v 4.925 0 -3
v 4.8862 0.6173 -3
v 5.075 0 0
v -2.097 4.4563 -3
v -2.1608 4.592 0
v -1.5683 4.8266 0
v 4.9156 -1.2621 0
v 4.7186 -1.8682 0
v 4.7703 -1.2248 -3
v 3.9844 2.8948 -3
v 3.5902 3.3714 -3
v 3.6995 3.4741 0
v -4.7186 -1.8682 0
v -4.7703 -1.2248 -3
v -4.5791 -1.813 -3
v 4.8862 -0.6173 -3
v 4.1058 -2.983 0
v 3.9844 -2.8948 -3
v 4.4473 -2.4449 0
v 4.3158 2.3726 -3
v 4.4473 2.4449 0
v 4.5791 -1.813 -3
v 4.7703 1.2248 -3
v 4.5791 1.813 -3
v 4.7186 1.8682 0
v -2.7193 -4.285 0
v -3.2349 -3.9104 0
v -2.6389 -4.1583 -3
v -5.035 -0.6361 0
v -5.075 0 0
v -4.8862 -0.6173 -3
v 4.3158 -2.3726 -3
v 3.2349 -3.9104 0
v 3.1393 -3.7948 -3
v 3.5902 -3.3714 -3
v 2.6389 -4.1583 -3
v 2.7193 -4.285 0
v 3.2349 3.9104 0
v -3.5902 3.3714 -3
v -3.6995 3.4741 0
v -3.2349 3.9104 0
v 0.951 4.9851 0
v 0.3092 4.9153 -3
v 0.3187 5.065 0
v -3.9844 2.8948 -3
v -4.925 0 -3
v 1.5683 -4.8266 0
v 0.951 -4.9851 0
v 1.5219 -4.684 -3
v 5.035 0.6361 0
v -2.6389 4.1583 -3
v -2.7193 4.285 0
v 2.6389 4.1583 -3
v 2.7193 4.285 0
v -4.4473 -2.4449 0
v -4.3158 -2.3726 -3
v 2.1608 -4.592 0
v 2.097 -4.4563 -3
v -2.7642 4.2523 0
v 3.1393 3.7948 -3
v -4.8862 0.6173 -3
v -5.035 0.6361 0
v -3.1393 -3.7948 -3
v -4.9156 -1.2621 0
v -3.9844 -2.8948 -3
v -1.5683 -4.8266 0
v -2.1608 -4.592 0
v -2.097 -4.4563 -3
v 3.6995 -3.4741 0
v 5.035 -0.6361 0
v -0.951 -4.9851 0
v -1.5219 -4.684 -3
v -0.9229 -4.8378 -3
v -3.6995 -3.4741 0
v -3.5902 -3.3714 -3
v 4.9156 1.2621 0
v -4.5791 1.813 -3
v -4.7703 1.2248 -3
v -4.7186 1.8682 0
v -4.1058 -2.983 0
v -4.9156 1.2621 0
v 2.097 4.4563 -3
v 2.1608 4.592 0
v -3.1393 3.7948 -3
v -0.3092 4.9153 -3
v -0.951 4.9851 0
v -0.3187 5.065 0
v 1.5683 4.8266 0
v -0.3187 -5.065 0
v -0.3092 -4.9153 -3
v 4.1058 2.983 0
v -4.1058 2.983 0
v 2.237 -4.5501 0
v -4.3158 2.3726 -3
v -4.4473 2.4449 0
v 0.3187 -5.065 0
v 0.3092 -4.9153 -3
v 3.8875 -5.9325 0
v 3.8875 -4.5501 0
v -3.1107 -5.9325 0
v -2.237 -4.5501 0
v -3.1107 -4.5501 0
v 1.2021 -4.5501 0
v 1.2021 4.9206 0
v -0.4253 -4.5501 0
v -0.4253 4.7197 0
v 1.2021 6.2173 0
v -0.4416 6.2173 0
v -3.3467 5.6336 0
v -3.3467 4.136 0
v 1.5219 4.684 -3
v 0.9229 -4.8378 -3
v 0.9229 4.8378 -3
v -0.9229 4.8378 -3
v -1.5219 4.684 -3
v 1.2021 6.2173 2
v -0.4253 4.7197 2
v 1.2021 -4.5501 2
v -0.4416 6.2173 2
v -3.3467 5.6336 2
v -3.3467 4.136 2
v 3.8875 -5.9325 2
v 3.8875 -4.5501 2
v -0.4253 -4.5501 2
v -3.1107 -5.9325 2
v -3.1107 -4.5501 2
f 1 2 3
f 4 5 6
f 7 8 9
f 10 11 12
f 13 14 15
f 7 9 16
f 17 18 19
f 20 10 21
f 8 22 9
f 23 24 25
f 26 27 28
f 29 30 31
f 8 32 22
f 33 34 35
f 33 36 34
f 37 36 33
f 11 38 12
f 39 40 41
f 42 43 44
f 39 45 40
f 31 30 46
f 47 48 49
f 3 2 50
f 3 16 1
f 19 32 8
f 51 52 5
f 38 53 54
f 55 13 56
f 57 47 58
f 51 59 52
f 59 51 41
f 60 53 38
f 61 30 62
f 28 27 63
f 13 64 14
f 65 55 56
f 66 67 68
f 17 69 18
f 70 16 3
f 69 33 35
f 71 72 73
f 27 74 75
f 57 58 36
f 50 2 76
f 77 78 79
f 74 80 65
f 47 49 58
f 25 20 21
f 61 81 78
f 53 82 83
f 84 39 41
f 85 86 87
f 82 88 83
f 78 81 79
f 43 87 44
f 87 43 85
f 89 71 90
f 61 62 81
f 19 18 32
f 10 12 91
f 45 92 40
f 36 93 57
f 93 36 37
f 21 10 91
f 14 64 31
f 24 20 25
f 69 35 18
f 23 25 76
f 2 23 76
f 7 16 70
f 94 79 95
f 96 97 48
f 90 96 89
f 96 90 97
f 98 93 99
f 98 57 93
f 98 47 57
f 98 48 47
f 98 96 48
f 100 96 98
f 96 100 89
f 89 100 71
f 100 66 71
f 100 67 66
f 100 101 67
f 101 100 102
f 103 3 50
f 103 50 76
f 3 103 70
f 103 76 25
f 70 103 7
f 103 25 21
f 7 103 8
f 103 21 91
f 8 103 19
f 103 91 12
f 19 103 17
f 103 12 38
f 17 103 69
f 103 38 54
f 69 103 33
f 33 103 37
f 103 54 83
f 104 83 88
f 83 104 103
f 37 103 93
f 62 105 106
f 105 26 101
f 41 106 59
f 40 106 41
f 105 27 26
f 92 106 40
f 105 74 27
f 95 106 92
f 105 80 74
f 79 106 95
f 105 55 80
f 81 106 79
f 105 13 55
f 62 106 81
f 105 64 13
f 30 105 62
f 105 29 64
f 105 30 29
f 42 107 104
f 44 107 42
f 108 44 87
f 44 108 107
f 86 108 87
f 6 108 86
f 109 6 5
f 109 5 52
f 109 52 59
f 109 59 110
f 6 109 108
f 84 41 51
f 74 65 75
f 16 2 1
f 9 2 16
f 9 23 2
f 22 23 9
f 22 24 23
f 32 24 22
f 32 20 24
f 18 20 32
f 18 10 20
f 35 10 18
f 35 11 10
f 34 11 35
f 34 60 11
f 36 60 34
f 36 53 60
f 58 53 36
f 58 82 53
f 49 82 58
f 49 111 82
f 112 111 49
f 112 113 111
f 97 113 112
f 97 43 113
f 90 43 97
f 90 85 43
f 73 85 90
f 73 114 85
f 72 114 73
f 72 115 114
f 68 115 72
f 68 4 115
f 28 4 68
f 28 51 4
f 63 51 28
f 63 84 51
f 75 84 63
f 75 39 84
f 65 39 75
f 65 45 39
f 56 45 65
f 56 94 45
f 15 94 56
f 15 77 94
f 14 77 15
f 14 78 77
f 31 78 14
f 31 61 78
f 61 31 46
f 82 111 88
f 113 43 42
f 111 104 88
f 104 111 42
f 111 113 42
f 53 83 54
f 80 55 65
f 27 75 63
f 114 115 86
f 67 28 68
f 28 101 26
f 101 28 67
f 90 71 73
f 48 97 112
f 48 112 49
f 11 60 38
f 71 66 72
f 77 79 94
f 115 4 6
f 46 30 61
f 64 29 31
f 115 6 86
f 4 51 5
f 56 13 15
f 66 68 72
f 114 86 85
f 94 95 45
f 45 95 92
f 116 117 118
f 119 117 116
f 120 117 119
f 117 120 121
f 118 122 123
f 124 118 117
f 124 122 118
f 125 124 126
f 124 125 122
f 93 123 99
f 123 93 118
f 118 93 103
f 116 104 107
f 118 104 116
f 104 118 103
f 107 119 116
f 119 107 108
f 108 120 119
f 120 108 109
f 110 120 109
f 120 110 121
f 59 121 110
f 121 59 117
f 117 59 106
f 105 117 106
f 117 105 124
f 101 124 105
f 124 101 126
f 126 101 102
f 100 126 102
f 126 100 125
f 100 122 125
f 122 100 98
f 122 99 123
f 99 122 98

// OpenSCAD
$fn = 50;

difference() {
	union() {
		translate(v = [0, 0, -3.0]) {
			cylinder(h = 3, r1 = 4.925, r2 = 5.075);
		}
		linear_extrude(height = 2) {
			text(font = "Impact", halign = "center", size = 12, text = "1", valign = "center");
		}
	}
	union();
}
